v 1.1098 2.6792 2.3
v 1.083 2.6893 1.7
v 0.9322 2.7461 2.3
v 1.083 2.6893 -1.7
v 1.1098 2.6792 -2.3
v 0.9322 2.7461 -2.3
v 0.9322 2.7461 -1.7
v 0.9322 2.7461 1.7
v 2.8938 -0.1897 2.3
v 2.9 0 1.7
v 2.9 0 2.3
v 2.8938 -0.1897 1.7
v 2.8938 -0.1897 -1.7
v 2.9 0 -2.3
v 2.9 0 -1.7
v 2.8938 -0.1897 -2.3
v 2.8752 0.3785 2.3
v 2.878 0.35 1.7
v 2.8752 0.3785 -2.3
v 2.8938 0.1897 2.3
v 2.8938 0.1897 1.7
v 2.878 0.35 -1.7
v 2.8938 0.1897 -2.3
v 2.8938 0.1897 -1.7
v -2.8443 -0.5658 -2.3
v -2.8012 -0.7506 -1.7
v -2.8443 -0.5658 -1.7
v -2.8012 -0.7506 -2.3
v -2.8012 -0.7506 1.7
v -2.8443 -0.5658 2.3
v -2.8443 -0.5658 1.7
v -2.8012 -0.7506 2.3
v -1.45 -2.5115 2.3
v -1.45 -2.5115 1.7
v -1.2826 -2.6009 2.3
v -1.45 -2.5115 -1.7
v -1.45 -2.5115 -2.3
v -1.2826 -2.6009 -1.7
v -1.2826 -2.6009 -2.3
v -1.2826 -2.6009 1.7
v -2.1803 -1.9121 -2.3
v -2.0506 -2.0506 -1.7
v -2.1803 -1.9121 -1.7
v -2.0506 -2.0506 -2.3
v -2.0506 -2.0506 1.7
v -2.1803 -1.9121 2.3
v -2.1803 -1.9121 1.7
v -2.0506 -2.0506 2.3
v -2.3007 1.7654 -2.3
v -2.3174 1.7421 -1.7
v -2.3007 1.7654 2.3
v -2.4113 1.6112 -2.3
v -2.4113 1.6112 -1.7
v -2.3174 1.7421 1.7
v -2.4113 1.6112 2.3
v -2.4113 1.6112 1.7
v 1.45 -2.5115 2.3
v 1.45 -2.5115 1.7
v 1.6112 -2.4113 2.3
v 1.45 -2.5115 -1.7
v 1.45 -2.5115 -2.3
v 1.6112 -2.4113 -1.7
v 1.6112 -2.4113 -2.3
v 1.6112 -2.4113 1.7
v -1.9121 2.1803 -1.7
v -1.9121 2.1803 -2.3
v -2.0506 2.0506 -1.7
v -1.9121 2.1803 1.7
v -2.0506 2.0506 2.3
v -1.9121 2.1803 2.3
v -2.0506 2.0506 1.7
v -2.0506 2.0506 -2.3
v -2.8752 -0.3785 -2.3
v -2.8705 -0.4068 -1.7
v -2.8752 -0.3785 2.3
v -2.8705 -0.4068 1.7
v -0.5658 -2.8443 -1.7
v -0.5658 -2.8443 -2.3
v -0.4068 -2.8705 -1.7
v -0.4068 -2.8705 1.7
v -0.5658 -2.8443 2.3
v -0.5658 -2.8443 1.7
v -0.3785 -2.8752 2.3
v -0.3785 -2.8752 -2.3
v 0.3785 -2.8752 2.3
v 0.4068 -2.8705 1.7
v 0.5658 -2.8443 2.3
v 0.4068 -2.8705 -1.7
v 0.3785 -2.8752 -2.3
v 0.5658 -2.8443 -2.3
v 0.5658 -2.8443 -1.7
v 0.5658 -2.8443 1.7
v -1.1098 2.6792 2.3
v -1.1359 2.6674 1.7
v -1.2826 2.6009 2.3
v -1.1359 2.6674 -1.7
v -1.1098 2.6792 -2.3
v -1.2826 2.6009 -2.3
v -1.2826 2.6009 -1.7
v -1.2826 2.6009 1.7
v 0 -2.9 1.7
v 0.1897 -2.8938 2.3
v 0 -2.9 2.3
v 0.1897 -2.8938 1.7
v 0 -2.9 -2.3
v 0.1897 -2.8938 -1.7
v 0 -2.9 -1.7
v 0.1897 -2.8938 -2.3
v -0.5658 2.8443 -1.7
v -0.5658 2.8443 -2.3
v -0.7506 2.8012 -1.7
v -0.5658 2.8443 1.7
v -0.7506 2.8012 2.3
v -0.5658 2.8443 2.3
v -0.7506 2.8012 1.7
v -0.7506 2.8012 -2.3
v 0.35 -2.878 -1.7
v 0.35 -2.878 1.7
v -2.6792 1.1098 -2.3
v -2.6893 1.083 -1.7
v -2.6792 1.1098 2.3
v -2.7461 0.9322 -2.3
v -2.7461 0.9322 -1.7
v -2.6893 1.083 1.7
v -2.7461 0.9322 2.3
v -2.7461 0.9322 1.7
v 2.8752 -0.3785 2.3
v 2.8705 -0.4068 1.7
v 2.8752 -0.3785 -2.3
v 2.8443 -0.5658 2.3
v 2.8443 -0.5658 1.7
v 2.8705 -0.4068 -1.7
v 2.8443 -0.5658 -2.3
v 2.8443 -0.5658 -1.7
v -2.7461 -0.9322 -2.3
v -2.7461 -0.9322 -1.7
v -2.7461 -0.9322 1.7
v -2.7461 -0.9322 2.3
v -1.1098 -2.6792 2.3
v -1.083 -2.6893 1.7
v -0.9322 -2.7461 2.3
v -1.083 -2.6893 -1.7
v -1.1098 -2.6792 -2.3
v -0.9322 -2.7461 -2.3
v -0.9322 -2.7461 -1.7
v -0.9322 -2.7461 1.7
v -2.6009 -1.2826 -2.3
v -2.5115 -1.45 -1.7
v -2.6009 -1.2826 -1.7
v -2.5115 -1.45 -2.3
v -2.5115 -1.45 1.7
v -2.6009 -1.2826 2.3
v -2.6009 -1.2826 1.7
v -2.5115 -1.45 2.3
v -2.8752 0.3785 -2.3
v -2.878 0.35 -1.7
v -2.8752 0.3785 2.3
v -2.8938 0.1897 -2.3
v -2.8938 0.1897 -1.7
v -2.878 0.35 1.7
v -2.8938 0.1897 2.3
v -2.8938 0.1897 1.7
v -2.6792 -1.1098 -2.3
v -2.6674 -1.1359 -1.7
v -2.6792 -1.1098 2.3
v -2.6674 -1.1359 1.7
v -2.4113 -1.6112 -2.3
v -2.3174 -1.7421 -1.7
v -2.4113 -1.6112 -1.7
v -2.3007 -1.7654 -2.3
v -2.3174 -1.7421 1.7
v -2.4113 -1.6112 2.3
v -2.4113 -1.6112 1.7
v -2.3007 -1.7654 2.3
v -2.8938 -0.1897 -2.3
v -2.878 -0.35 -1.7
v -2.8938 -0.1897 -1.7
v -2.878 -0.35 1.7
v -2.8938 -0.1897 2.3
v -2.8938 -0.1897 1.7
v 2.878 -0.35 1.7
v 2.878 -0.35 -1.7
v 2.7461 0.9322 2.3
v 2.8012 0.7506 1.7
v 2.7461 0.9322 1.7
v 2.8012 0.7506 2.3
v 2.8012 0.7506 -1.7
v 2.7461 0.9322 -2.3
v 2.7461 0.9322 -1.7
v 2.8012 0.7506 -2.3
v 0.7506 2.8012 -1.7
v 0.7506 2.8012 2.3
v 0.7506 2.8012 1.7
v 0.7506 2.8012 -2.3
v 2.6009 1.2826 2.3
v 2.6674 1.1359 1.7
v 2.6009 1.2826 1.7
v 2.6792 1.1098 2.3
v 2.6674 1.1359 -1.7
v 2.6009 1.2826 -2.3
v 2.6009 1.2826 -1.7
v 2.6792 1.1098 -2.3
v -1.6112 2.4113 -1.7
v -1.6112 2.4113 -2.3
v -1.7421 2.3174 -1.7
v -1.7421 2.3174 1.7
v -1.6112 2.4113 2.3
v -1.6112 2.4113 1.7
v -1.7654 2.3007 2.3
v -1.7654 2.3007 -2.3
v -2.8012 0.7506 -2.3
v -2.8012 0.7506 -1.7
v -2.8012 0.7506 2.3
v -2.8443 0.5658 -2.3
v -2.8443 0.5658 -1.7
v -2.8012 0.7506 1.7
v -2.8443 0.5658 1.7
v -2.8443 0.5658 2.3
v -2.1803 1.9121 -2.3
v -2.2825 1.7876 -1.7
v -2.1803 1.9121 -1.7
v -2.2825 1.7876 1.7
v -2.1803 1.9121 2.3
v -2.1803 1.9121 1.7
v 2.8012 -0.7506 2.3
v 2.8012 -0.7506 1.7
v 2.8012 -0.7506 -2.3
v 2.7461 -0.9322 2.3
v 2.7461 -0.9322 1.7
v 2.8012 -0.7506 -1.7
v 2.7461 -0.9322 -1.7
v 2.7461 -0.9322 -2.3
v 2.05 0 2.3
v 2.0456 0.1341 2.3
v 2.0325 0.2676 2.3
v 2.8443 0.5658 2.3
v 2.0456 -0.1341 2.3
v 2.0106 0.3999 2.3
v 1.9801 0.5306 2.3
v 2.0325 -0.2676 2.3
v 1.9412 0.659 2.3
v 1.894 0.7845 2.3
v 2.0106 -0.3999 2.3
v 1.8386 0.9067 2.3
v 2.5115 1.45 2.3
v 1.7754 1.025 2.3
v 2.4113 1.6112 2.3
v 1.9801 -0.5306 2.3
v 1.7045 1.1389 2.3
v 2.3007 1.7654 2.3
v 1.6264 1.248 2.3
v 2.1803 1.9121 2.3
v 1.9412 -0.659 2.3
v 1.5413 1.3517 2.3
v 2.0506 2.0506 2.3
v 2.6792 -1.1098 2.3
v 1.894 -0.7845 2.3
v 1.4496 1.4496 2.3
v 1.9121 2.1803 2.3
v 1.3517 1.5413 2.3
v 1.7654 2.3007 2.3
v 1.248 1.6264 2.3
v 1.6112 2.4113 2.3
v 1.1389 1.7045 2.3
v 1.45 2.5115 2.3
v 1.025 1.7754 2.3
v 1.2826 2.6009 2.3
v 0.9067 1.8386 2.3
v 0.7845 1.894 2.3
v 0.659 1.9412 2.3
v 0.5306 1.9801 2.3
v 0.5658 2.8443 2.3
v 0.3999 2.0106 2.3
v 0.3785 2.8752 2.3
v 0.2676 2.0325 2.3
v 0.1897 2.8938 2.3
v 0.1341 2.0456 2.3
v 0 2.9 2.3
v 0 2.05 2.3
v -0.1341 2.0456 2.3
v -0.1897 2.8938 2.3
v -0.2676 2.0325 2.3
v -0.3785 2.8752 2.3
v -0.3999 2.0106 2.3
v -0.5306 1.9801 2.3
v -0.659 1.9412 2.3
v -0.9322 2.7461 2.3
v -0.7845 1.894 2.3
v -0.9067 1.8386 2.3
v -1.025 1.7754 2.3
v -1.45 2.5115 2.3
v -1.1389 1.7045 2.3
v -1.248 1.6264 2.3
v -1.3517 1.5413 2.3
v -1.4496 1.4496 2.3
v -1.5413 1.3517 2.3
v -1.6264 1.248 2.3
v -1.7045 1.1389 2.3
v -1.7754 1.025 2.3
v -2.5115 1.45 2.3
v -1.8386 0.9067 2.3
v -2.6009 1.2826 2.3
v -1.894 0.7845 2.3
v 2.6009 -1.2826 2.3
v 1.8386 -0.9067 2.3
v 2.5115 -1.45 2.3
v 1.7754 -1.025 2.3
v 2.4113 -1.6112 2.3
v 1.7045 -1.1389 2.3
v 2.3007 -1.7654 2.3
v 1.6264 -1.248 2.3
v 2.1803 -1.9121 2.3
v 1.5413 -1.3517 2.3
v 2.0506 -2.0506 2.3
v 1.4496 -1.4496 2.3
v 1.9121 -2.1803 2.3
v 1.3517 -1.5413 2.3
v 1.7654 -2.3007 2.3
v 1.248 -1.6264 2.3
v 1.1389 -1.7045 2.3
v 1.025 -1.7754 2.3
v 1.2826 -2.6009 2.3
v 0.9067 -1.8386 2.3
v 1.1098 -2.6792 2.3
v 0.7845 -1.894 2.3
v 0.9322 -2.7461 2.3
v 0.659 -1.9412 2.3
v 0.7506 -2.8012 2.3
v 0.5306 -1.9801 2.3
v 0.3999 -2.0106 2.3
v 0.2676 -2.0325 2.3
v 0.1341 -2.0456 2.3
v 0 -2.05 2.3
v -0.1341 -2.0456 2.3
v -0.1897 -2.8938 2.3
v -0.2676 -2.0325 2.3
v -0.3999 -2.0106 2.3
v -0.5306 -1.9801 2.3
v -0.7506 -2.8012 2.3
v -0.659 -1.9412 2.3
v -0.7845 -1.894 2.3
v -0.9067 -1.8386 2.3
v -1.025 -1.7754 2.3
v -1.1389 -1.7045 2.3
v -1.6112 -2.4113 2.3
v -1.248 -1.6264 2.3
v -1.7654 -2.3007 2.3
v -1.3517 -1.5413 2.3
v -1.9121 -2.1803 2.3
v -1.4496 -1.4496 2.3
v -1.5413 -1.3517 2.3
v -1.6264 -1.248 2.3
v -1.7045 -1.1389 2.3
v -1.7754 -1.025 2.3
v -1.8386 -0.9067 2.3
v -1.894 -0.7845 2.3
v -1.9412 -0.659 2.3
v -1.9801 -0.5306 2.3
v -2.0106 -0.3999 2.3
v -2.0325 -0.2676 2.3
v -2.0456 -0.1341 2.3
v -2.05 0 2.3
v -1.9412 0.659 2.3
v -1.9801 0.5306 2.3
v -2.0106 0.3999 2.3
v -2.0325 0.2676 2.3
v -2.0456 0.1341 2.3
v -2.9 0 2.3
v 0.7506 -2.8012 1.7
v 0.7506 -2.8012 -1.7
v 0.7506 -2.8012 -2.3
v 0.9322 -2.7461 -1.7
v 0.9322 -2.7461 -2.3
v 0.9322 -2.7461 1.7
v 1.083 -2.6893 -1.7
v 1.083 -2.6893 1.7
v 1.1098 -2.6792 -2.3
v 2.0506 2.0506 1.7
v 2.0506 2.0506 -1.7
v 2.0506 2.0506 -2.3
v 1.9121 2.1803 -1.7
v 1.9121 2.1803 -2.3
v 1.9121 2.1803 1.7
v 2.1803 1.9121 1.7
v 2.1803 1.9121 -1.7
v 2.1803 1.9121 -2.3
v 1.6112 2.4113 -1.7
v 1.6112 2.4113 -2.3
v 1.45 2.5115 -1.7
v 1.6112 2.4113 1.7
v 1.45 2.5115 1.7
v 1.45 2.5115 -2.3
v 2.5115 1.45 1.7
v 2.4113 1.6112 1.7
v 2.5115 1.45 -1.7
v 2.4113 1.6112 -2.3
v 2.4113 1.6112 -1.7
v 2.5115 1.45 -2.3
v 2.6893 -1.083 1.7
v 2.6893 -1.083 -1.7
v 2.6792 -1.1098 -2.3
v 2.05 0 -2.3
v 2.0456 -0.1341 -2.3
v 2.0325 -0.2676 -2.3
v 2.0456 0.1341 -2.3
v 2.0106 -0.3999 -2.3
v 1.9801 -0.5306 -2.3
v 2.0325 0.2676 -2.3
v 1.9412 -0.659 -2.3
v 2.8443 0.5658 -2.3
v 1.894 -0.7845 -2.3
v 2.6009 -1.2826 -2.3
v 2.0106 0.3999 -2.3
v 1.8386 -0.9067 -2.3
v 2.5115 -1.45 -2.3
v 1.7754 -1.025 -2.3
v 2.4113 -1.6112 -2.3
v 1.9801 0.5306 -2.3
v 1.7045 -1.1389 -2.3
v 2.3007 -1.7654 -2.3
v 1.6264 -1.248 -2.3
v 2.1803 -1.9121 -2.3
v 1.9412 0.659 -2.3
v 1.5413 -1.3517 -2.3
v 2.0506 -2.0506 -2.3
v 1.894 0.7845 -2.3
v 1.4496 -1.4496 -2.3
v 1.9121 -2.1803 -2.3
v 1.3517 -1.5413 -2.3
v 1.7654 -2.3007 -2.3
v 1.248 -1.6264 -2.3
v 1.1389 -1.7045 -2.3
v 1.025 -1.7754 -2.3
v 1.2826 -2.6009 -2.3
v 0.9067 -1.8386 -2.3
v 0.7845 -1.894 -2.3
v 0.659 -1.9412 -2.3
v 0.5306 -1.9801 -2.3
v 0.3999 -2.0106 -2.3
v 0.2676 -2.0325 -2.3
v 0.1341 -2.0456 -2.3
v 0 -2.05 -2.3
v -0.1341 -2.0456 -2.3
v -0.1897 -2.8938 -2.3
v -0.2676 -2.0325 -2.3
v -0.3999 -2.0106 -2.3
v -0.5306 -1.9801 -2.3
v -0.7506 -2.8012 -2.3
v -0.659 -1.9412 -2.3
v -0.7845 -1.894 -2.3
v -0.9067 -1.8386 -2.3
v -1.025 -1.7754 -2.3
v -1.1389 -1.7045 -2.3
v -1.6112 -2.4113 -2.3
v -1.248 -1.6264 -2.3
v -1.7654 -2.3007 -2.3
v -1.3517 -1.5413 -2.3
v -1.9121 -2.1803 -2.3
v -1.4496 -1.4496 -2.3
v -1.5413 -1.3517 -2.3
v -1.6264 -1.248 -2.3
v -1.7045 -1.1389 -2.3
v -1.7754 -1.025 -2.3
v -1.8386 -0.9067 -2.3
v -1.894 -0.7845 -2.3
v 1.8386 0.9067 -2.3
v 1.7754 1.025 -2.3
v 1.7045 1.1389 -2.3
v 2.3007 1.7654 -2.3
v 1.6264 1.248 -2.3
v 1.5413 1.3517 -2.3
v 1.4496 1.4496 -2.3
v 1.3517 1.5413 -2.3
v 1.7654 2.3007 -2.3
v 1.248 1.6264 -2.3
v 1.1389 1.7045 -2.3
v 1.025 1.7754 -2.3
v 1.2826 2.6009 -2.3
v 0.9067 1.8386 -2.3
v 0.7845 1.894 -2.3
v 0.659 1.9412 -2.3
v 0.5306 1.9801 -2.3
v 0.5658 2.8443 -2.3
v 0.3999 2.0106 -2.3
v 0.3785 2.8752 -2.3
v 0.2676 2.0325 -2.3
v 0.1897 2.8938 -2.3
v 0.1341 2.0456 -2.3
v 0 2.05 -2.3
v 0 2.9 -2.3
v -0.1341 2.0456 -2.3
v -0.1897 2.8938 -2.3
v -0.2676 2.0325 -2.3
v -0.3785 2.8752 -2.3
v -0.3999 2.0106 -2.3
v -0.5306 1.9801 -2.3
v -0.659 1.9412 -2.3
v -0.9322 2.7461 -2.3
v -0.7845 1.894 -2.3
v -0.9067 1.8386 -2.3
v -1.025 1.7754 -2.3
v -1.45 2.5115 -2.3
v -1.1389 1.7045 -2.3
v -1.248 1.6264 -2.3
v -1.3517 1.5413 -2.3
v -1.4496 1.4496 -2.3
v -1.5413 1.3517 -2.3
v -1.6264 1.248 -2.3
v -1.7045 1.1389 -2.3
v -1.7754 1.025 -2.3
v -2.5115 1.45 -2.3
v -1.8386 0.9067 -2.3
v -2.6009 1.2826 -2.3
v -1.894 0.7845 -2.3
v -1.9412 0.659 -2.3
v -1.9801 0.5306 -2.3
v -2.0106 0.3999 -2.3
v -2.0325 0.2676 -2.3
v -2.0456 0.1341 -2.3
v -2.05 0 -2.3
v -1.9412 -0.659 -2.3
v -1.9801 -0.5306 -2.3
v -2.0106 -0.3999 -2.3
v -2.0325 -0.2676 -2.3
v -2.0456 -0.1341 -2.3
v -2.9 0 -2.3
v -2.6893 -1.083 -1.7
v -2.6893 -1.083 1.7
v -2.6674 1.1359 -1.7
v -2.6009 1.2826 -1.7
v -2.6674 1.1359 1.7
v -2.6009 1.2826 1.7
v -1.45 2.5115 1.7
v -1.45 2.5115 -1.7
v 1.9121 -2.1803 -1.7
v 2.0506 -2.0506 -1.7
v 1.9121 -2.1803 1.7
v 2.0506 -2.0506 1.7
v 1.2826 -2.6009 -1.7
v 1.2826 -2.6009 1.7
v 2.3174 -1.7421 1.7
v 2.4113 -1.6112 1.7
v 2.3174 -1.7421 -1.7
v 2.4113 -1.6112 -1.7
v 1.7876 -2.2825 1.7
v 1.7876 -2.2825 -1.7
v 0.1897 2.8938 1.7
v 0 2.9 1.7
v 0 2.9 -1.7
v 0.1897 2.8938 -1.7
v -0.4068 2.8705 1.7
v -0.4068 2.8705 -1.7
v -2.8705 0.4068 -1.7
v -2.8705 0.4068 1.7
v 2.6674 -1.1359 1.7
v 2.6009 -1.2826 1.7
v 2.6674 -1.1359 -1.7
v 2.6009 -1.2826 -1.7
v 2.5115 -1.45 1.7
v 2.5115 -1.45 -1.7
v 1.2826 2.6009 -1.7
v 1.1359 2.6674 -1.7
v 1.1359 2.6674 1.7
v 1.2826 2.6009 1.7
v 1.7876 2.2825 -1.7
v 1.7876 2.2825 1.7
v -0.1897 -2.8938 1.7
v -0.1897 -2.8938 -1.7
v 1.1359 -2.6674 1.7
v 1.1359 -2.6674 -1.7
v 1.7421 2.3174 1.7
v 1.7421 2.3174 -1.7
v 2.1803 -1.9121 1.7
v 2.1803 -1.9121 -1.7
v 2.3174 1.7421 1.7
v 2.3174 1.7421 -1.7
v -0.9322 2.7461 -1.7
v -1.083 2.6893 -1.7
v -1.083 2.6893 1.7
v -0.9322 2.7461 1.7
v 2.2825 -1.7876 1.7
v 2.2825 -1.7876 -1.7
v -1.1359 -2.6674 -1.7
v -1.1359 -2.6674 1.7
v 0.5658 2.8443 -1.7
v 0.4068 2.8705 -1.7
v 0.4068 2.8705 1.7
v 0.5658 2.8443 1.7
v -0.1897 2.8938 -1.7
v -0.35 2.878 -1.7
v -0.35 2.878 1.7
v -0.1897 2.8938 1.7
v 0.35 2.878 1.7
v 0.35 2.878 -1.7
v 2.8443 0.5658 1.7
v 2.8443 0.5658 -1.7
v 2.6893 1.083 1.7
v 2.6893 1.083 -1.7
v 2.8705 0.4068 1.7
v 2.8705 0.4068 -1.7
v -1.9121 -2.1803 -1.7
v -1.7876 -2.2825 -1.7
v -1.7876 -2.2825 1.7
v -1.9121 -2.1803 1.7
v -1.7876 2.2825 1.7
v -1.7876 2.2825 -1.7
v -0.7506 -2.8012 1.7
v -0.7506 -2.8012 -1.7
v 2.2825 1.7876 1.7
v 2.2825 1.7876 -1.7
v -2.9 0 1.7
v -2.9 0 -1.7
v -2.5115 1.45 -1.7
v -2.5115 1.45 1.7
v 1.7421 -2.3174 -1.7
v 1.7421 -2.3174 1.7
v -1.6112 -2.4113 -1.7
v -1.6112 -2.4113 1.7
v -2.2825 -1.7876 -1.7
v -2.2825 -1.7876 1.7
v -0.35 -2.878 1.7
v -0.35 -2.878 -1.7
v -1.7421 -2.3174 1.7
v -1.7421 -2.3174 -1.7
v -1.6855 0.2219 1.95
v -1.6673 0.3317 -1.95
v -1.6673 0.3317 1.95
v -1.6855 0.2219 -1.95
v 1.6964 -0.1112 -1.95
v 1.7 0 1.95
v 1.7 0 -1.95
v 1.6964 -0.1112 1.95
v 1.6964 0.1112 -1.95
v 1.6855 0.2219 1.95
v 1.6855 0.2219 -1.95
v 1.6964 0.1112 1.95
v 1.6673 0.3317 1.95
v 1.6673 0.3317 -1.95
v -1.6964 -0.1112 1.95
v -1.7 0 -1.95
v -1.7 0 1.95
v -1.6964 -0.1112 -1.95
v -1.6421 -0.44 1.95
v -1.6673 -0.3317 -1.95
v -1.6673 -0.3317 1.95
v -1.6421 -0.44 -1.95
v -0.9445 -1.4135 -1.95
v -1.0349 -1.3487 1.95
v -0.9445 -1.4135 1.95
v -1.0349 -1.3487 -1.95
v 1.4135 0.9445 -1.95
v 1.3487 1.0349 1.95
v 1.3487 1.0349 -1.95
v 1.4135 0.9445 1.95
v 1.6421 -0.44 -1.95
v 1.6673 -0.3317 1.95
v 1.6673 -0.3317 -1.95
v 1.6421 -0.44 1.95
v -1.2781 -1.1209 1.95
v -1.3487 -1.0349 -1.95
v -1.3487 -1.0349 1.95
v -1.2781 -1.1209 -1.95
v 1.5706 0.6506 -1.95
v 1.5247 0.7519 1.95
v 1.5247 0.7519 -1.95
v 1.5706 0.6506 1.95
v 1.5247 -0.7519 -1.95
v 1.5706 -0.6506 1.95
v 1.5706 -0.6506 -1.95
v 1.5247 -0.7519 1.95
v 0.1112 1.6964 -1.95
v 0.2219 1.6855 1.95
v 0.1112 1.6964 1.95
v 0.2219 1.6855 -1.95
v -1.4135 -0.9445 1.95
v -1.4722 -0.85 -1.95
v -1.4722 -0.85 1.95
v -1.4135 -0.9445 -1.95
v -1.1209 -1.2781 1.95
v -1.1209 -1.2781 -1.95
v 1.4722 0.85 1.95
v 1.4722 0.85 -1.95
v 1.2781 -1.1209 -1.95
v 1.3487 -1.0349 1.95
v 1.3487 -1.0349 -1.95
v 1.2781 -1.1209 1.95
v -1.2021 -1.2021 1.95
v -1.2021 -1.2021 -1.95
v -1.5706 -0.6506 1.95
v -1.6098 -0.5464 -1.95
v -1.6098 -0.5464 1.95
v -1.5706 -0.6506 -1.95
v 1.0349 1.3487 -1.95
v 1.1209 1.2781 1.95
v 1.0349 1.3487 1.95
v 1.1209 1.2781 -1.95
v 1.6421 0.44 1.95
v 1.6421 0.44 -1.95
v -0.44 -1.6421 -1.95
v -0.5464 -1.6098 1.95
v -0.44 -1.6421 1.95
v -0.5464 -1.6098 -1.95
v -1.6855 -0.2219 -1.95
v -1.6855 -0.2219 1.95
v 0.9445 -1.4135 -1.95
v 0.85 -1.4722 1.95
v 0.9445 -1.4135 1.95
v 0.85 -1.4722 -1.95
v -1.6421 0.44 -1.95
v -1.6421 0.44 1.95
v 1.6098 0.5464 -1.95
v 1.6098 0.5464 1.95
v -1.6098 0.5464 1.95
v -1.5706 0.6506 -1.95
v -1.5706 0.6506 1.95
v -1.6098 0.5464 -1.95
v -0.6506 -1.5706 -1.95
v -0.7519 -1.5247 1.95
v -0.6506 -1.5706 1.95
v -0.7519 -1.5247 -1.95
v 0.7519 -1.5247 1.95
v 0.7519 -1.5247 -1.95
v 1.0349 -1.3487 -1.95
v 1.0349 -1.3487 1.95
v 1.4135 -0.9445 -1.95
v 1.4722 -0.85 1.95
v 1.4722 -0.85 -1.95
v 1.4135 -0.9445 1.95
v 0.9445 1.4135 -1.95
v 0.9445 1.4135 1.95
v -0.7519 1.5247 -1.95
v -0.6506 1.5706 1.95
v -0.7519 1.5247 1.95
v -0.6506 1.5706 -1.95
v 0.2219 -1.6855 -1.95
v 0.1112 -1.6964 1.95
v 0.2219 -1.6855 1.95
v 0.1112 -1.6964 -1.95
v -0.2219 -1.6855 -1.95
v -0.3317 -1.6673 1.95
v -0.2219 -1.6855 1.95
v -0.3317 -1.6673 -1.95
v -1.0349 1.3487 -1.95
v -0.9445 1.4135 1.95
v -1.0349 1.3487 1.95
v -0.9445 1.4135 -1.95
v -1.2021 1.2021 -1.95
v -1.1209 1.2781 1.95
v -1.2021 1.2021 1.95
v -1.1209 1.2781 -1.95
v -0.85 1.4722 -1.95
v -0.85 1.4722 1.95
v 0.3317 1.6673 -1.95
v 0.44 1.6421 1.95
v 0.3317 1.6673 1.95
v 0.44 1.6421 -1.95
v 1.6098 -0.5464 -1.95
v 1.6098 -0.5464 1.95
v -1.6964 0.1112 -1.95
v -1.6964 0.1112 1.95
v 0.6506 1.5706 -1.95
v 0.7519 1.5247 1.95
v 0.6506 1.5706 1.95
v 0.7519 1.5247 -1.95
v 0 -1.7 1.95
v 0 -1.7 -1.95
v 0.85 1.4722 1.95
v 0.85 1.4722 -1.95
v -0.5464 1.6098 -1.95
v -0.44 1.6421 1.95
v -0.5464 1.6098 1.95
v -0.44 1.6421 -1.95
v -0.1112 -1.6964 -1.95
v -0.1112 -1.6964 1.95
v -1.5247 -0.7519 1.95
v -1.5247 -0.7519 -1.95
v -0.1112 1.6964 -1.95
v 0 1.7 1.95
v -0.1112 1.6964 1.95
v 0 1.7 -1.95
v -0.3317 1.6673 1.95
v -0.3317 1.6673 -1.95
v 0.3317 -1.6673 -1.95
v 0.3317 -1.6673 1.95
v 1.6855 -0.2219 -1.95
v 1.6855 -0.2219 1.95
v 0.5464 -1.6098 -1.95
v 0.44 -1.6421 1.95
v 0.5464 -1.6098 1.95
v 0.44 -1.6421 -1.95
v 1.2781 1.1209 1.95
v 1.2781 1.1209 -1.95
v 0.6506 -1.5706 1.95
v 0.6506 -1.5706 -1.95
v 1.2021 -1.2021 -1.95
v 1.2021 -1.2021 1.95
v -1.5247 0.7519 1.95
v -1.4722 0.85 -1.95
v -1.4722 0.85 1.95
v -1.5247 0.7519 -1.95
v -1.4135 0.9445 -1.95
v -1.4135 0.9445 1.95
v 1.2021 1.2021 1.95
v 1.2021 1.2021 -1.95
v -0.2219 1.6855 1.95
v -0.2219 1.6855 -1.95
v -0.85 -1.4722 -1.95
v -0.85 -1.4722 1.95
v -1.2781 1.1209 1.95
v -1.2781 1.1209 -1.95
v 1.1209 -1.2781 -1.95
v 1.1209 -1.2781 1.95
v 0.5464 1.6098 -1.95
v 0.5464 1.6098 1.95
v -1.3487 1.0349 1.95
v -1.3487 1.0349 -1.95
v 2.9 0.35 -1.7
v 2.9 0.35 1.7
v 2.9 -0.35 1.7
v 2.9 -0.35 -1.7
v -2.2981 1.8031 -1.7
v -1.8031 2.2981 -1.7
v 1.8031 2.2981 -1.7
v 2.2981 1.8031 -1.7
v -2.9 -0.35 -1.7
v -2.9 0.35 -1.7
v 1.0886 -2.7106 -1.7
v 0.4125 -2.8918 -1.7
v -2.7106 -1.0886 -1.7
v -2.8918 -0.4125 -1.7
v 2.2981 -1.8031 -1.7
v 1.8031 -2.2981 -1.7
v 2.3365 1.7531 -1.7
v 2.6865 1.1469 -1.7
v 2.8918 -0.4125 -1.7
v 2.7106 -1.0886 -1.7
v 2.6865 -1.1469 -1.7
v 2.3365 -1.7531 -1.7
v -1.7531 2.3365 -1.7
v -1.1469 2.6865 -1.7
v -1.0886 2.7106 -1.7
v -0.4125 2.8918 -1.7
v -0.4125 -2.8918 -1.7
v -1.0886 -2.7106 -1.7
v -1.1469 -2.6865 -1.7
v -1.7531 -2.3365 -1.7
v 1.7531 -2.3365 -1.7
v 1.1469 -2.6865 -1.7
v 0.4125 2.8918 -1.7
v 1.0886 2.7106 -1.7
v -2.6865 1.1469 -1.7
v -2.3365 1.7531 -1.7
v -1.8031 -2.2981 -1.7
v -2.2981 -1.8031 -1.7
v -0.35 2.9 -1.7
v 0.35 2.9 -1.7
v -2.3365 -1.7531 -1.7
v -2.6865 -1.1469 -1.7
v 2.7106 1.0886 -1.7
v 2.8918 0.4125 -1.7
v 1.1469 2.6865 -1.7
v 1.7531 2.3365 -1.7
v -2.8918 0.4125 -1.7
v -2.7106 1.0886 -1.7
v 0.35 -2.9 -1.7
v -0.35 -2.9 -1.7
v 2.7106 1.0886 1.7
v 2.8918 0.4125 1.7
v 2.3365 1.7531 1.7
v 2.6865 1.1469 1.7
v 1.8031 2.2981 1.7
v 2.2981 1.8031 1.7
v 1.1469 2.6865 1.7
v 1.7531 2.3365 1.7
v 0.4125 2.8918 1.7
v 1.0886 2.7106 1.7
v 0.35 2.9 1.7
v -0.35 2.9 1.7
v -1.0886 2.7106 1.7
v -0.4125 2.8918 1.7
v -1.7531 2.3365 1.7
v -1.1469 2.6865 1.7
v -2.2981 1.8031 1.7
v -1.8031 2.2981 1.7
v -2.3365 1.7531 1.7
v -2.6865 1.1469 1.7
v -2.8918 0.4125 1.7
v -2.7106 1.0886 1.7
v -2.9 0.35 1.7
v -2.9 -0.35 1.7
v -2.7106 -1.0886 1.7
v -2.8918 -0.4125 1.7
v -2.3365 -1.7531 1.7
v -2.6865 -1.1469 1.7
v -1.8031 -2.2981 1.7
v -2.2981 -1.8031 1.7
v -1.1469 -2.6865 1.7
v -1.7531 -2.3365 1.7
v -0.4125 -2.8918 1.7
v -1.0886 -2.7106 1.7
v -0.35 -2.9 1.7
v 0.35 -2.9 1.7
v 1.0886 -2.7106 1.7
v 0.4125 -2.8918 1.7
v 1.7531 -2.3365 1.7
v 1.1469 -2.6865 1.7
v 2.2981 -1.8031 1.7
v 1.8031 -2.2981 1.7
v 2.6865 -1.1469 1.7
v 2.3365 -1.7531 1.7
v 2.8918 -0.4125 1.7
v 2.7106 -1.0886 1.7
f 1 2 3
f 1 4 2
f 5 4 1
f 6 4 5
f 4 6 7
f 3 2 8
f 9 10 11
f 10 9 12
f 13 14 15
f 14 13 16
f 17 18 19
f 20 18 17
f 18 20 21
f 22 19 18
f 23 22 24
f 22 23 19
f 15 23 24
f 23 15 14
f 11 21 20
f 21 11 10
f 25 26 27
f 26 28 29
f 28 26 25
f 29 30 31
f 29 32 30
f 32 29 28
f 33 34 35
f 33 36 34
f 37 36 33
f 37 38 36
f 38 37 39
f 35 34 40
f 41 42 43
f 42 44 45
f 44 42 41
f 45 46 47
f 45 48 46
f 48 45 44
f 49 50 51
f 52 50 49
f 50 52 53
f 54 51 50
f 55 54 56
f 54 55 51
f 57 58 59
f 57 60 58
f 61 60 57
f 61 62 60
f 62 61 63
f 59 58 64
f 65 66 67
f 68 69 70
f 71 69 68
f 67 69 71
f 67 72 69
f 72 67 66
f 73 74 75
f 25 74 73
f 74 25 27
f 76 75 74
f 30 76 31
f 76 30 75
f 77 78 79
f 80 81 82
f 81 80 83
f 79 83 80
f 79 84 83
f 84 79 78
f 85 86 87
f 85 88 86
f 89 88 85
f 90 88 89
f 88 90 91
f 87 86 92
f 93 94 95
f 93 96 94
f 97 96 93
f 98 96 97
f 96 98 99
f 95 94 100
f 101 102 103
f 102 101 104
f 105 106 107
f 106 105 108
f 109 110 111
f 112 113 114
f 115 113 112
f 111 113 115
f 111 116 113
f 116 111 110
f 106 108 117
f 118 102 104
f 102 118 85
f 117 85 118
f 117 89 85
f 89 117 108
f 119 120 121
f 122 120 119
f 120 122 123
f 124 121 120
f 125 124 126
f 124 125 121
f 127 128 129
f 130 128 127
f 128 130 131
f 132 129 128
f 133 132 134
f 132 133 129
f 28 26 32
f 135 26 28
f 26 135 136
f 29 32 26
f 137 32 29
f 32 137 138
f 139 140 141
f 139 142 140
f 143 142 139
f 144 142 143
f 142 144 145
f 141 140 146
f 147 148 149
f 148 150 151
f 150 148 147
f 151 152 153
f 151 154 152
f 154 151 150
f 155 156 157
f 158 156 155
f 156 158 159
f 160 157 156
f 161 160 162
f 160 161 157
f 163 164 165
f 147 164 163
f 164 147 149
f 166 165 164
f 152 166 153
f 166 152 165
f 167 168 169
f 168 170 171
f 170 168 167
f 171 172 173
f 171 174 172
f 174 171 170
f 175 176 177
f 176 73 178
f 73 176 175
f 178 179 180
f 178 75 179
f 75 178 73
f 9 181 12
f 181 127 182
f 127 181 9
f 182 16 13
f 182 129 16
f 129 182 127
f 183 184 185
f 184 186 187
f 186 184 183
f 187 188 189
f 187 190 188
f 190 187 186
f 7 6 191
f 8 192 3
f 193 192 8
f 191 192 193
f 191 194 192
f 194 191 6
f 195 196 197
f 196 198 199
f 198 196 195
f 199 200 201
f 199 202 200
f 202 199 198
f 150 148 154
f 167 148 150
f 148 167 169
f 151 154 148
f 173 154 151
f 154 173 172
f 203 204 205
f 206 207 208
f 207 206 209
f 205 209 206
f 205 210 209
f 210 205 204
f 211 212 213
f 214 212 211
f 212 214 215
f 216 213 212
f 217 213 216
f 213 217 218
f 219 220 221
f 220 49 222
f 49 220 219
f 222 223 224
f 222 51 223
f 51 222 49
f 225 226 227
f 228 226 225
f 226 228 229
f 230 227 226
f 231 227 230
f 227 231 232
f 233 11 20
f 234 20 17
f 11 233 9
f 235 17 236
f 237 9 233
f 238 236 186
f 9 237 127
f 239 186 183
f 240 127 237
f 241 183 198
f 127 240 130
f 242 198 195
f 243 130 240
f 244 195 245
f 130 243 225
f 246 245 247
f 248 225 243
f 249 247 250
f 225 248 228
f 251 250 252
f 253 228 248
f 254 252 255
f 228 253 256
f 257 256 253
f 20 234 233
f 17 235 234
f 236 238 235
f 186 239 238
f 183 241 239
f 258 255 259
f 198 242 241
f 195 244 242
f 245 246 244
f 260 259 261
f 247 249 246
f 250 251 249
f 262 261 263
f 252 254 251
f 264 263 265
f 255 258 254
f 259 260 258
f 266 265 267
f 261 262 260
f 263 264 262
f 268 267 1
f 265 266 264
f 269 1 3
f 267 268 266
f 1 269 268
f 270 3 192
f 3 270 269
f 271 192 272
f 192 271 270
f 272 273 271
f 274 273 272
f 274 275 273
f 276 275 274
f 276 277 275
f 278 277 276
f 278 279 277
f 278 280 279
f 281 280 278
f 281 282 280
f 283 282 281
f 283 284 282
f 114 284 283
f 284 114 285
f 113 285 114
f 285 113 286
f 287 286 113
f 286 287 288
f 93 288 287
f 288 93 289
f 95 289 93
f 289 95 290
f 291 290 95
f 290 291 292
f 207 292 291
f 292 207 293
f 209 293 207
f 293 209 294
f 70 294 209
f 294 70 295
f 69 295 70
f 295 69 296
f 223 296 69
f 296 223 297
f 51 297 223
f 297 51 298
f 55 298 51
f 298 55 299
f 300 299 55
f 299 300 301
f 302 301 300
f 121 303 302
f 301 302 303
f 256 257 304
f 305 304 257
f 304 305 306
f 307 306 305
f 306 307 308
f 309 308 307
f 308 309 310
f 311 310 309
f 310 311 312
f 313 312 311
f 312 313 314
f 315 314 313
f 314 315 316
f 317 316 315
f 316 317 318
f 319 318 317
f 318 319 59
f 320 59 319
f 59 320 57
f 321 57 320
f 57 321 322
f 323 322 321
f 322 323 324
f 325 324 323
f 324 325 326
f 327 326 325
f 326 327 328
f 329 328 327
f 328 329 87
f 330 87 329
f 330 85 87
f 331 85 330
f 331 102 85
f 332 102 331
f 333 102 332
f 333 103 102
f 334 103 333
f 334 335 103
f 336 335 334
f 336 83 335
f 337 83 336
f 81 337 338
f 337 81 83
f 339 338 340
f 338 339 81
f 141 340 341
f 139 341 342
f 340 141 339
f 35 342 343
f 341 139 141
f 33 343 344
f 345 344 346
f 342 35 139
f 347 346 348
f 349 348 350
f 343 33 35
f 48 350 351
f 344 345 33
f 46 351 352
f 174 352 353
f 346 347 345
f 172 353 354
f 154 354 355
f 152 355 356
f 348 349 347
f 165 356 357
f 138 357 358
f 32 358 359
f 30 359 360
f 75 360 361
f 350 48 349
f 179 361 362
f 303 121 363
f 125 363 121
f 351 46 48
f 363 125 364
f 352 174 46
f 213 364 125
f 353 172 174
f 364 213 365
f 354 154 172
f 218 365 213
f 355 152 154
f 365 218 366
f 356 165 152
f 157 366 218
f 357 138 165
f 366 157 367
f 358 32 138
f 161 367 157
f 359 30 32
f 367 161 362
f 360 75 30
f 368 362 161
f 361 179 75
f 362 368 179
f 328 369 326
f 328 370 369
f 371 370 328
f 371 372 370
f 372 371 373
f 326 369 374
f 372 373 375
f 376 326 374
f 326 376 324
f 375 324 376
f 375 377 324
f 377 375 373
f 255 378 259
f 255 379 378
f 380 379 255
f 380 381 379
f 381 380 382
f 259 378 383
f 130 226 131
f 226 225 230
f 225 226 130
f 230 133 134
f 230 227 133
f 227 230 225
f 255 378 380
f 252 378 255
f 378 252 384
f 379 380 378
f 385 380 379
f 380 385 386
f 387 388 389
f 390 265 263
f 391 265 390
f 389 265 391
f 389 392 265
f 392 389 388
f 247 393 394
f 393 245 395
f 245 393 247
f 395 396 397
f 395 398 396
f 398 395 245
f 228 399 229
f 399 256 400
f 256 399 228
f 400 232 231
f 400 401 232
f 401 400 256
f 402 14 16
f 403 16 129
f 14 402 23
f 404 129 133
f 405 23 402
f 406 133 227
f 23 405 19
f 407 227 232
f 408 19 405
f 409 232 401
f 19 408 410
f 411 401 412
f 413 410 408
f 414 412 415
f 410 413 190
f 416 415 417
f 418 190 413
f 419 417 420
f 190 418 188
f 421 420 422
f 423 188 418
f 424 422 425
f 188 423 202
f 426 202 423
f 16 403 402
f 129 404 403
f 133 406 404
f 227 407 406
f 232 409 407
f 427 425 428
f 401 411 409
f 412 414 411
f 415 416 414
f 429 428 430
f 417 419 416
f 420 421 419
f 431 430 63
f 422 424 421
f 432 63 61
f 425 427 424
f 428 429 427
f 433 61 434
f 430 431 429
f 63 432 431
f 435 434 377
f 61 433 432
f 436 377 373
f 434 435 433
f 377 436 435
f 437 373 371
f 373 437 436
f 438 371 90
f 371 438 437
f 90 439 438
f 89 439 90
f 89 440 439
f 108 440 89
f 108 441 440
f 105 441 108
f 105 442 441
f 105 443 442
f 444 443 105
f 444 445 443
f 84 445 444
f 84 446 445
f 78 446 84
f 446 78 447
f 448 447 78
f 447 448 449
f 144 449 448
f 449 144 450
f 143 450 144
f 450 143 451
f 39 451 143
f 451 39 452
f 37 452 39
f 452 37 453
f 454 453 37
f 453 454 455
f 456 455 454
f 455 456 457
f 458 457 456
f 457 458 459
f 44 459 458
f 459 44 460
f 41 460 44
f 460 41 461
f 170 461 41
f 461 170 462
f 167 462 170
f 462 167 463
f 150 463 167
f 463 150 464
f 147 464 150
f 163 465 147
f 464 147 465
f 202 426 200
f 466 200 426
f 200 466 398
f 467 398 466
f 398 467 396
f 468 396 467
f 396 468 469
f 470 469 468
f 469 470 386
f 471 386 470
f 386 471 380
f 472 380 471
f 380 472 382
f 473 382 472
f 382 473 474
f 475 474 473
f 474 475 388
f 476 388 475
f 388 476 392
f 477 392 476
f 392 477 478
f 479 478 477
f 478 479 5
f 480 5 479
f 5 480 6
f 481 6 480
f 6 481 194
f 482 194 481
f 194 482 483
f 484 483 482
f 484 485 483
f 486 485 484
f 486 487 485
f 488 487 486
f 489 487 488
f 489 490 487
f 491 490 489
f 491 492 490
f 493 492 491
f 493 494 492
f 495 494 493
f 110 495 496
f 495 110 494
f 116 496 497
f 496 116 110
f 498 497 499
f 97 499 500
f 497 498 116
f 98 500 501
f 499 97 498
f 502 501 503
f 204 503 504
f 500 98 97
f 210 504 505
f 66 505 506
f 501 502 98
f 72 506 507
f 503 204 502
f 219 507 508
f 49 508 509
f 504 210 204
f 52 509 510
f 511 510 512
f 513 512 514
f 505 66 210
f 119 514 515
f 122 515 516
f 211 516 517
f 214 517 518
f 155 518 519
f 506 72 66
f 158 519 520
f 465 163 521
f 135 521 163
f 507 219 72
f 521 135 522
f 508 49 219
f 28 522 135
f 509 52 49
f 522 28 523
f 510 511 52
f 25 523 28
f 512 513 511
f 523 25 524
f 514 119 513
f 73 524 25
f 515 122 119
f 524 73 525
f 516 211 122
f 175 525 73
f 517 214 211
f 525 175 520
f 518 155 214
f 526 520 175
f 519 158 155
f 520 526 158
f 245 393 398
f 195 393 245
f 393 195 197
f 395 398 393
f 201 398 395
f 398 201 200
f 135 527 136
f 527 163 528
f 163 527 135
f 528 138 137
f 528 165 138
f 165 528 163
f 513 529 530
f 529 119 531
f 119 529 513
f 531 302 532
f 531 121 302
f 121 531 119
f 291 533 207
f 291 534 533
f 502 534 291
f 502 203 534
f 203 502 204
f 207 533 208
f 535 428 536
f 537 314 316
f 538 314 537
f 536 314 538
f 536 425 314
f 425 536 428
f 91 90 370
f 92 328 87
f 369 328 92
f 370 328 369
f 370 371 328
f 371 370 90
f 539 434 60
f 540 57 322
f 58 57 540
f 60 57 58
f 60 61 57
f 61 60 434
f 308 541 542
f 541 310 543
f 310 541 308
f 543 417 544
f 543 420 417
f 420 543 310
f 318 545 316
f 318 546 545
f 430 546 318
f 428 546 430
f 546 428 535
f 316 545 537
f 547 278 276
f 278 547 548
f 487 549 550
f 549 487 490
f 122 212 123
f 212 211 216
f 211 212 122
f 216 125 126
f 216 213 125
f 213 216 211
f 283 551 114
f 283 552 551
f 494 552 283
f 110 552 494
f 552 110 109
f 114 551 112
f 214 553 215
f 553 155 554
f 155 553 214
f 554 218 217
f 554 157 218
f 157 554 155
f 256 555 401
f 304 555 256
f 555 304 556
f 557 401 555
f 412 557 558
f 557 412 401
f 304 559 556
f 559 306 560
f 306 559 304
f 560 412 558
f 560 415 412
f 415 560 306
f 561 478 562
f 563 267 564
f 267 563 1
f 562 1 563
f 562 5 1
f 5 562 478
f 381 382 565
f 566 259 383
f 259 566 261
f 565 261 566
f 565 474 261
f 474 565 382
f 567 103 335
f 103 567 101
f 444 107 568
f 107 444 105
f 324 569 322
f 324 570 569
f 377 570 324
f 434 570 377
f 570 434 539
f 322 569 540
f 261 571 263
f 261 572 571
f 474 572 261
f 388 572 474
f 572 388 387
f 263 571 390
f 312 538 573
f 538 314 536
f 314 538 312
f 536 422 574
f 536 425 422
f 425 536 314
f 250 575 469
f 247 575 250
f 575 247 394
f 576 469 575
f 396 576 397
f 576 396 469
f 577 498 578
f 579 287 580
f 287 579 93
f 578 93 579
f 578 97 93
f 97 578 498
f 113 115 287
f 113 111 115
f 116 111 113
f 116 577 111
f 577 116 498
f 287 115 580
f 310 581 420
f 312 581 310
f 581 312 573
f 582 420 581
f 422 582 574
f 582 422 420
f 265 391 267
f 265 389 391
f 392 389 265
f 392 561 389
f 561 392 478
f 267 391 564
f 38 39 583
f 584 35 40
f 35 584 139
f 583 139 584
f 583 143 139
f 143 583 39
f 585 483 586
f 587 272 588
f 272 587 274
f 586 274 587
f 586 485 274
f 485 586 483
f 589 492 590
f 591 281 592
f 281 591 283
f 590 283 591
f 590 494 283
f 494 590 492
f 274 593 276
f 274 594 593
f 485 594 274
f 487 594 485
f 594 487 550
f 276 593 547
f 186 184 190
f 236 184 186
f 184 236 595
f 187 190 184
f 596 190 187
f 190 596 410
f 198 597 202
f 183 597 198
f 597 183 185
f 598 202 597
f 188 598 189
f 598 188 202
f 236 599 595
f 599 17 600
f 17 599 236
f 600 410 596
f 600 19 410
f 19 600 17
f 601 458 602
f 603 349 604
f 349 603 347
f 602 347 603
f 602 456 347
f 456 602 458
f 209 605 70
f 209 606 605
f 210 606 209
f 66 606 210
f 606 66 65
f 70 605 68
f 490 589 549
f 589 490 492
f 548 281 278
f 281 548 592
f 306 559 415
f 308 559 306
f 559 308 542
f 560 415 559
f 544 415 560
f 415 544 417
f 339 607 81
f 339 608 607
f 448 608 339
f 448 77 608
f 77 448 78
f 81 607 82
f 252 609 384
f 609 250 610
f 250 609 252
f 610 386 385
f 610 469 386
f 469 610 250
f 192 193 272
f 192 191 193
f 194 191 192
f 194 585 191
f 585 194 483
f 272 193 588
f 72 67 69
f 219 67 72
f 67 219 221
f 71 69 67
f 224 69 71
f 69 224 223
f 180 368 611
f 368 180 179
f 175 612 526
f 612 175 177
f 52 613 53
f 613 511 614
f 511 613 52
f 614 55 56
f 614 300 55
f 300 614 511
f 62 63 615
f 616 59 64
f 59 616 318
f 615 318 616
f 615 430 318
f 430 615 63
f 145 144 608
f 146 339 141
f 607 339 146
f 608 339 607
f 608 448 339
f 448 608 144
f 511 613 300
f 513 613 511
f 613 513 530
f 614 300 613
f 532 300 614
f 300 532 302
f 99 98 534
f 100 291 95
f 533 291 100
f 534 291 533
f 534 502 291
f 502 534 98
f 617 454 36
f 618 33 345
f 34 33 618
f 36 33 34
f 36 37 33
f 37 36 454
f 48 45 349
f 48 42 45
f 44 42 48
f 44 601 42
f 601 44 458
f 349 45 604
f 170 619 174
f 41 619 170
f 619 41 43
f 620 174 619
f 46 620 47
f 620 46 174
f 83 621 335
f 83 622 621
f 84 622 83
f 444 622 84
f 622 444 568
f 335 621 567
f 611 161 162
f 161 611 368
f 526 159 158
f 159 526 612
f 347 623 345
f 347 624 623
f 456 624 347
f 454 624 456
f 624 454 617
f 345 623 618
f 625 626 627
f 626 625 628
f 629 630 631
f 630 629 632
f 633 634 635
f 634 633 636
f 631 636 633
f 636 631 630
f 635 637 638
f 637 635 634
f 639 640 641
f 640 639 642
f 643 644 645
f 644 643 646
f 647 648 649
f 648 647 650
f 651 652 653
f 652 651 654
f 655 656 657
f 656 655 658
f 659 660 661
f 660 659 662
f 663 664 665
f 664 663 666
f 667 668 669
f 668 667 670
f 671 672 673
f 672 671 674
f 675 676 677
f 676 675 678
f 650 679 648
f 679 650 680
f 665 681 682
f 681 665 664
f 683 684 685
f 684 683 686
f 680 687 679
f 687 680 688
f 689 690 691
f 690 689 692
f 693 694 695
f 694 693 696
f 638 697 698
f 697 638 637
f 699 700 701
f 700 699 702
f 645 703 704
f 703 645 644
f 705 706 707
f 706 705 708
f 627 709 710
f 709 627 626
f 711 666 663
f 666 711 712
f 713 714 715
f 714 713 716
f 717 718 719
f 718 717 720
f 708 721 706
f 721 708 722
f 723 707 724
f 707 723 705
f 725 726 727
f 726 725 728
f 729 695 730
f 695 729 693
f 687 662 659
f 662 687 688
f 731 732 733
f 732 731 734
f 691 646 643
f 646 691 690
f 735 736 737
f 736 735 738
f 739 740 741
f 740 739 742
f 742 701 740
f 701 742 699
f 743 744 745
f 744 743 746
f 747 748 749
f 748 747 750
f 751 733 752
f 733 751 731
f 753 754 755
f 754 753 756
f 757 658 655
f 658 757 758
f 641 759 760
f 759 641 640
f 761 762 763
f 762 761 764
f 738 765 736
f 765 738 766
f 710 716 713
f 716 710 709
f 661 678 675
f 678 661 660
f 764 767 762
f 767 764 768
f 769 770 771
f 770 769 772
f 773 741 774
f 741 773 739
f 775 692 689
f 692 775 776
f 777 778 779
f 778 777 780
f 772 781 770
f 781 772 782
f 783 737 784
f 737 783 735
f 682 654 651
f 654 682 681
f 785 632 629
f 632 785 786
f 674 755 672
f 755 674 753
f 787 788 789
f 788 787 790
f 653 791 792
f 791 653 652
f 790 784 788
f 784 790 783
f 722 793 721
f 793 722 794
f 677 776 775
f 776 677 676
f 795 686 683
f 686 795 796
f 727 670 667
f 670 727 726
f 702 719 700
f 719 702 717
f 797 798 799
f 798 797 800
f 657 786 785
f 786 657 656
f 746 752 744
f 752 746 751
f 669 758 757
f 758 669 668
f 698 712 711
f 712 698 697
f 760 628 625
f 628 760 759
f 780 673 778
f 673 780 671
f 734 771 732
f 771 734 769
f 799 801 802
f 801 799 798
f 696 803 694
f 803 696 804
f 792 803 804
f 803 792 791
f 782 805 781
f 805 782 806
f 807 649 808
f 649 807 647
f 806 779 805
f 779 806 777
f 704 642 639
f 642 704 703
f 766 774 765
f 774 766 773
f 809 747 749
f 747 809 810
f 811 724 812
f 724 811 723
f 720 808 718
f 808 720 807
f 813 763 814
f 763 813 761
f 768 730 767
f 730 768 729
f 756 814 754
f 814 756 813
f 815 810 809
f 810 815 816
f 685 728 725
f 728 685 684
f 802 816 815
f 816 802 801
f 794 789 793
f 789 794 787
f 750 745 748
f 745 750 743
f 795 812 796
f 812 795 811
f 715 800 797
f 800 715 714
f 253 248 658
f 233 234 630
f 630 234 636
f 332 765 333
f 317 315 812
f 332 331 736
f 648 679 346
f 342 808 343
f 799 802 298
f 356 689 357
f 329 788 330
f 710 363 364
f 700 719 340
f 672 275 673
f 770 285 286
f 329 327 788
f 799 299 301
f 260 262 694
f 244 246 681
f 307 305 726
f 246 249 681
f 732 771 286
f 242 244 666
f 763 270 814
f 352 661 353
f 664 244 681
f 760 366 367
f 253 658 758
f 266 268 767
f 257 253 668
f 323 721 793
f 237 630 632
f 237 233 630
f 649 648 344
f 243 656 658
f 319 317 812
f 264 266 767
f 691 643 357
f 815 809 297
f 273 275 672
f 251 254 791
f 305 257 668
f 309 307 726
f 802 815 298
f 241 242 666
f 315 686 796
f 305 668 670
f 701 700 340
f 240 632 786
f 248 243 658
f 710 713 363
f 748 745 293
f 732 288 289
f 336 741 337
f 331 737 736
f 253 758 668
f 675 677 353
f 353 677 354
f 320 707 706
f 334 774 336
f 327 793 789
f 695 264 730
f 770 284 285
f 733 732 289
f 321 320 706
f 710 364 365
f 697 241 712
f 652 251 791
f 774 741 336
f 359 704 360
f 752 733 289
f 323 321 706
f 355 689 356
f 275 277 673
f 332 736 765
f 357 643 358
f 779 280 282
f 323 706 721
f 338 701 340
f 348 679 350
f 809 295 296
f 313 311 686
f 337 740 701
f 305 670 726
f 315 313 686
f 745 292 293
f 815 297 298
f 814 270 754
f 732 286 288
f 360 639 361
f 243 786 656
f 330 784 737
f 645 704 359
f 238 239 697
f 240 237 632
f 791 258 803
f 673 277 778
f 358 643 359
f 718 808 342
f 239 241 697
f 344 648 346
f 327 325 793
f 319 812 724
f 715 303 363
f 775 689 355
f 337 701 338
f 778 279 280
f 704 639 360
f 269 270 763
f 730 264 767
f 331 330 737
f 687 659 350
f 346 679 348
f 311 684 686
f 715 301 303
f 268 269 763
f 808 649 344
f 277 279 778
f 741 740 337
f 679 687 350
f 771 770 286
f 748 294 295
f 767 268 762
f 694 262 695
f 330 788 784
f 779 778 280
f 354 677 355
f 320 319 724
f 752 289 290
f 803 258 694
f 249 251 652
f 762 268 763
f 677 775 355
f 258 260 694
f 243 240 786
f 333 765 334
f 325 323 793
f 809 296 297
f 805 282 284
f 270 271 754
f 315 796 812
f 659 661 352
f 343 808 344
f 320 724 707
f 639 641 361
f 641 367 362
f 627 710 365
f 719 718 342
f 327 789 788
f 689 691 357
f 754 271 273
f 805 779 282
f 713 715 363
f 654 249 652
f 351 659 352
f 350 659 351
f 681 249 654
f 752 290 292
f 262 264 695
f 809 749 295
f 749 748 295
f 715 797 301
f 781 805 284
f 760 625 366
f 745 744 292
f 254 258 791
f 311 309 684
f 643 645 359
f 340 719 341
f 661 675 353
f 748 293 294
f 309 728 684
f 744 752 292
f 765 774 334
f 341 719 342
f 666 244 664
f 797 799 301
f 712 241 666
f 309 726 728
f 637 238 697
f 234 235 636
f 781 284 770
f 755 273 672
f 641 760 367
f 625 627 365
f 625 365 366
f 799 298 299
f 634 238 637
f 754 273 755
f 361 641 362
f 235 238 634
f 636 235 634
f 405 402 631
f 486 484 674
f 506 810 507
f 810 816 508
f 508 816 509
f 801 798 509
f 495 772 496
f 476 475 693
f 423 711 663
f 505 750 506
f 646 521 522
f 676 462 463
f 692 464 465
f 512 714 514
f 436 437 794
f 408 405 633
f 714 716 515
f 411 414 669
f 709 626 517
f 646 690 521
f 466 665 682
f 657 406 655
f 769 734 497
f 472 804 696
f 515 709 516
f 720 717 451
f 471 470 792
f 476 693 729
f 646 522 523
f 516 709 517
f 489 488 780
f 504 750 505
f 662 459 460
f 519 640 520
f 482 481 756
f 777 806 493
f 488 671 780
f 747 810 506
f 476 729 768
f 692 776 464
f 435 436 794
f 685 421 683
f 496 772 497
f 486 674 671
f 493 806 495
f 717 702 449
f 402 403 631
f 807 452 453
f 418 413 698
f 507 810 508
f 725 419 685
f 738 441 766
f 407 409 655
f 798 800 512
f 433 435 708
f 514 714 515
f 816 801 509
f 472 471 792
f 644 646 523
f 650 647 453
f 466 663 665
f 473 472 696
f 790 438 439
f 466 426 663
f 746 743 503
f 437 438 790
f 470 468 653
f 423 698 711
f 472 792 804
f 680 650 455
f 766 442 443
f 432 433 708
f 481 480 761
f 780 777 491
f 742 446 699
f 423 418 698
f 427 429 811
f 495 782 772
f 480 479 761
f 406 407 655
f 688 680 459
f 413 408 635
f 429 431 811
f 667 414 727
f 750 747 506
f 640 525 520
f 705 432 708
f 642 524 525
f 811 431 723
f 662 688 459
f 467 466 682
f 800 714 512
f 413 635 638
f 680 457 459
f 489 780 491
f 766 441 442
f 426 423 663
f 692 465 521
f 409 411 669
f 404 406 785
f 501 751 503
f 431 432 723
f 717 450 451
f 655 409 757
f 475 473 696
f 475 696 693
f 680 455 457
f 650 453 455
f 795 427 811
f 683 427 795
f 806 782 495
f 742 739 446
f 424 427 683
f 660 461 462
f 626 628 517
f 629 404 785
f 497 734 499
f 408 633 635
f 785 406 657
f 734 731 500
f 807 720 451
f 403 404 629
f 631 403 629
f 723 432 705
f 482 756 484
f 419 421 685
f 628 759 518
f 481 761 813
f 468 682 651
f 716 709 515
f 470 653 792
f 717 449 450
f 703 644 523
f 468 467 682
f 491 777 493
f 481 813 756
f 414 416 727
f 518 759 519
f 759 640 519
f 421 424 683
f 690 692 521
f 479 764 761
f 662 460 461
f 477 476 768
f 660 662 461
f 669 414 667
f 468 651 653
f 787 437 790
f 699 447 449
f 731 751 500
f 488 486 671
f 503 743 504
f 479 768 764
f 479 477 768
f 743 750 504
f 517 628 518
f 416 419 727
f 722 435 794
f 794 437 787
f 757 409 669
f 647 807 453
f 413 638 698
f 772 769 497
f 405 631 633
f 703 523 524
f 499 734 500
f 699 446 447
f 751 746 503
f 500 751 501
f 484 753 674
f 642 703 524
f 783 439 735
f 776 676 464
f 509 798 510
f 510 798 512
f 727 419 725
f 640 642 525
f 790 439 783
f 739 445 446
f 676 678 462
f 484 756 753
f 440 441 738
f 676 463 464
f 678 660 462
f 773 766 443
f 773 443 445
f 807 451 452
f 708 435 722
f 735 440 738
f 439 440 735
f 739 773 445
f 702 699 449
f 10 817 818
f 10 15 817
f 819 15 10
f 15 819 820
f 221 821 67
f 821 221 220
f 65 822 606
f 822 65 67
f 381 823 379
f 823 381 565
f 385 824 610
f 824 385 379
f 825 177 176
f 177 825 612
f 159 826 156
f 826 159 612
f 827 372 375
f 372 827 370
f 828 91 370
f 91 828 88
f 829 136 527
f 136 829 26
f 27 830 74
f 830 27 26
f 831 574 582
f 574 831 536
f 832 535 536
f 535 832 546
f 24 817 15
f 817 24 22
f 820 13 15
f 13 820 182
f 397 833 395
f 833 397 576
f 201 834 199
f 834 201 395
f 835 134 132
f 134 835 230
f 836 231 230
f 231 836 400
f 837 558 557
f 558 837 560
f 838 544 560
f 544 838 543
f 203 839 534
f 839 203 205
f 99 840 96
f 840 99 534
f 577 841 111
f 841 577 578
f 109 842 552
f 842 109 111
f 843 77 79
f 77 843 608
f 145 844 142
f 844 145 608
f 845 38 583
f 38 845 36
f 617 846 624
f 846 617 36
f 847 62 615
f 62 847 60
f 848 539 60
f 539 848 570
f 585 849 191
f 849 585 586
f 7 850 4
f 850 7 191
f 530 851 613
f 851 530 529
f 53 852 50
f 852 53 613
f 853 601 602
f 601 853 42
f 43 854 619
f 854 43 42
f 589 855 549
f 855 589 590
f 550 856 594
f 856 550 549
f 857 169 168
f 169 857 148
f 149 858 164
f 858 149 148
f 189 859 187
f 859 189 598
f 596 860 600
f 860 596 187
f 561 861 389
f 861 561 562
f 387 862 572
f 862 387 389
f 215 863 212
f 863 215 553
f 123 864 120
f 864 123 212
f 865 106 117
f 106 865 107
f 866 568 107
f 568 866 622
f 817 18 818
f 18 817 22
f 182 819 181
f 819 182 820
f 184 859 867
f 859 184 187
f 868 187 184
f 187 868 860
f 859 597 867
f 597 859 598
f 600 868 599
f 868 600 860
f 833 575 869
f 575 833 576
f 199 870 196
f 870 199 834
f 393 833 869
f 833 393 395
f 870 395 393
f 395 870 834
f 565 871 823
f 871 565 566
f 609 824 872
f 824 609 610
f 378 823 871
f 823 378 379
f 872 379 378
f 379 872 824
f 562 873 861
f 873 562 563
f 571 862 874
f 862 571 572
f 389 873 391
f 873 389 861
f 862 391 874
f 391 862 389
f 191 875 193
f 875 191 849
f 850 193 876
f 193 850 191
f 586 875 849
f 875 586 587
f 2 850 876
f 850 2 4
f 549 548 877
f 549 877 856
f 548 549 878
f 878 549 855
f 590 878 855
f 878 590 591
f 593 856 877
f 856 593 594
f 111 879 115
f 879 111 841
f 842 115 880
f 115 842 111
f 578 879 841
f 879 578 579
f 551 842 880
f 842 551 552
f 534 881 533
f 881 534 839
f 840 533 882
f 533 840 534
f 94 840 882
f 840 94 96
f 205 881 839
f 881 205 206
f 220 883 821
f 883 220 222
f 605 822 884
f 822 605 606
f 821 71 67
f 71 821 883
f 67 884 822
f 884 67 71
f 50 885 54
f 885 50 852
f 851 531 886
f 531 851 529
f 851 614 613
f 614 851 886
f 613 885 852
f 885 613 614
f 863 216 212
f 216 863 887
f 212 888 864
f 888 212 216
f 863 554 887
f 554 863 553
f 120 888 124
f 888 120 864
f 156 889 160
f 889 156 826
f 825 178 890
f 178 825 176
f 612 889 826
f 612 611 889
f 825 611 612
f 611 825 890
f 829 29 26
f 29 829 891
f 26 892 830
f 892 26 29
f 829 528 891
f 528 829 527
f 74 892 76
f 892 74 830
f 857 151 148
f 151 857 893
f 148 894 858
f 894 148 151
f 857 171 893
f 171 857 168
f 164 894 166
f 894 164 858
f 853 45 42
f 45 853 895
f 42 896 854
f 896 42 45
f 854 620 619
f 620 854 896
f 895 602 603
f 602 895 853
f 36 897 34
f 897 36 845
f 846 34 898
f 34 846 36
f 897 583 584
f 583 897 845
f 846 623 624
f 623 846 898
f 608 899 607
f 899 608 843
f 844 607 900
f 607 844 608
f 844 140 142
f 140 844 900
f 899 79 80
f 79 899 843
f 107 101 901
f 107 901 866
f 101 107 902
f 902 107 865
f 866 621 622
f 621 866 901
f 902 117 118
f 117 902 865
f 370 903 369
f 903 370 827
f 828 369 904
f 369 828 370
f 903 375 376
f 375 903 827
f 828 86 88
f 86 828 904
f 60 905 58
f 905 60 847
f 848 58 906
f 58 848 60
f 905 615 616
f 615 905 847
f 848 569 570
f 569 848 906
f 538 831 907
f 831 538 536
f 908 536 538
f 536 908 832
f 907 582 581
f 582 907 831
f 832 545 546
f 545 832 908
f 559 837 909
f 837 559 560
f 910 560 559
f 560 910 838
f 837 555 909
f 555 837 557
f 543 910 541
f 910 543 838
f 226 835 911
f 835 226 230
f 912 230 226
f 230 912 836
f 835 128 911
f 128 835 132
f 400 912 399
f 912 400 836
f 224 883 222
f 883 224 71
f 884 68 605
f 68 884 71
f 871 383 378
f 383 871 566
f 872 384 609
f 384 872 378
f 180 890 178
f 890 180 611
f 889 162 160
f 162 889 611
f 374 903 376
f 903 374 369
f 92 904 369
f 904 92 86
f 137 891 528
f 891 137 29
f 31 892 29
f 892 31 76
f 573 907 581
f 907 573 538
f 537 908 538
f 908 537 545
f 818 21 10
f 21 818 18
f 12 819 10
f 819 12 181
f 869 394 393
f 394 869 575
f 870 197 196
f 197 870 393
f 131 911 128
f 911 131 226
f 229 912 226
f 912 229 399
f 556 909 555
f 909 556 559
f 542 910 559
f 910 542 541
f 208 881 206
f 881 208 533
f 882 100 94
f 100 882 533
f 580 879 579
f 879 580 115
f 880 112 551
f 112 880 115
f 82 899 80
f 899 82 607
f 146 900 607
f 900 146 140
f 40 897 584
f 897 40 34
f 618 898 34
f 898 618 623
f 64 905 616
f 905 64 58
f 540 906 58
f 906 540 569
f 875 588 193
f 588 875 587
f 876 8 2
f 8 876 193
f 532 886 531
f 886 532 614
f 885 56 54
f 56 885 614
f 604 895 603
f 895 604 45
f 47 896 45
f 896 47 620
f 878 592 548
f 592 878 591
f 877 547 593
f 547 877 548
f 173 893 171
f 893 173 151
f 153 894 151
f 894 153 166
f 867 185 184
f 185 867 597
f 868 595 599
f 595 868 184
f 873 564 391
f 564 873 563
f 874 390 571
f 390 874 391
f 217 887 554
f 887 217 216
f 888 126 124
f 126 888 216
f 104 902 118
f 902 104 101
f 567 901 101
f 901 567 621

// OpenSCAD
$fn=96;

od = 5.8;
len = 4.6;
screw_d = 3.0;

wall = 0.6;
id = screw_d + 0.4;

knurl_depth = 0.35;
knurl_count = 24;

lead_in = 0.5;
chamfer = 0.35;

module knurl_ring(z0, z1, r_base, depth, n){
    for(i=[0:n-1]){
        rotate([0,0,360*i/n])
            translate([r_base - depth/2,0,(z0+z1)/2])
                cube([depth, 0.7, (z1-z0)], center=true);
    }
}

module insert_body(){
    r = od/2;
    difference(){
        union(){
            cylinder(h=len, r=r, center=true);
            translate([0,0,len/2 - lead_in/2])
                cylinder(h=lead_in, r1=r-0.25, r2=r, center=true);
            translate([0,0,-len/2 + lead_in/2])
                cylinder(h=lead_in, r1=r, r2=r-0.25, center=true);
        }
        translate([0,0,0])
            cylinder(h=len+0.2, r=id/2, center=true);
        translate([0,0,len/2 - chamfer/2])
            cylinder(h=chamfer, r1=id/2, r2=id/2 + 0.35, center=true);
        translate([0,0,-len/2 + chamfer/2])
            cylinder(h=chamfer, r1=id/2 + 0.35, r2=id/2, center=true);
    }
}

module heat_set_insert(){
    difference(){
        union(){
            insert_body();
            knurl_ring(-len/2 + 0.6, -len/2 + 1.6, od/2, knurl_depth, knurl_count);
            knurl_ring(-0.8, 0.8, od/2, knurl_depth, knurl_count);
            knurl_ring(len/2 - 1.6, len/2 - 0.6, od/2, knurl_depth, knurl_count);
        }
        translate([0,0,0])
            cylinder(h=len+0.4, r=id/2, center=true);
    }
}

heat_set_insert();
